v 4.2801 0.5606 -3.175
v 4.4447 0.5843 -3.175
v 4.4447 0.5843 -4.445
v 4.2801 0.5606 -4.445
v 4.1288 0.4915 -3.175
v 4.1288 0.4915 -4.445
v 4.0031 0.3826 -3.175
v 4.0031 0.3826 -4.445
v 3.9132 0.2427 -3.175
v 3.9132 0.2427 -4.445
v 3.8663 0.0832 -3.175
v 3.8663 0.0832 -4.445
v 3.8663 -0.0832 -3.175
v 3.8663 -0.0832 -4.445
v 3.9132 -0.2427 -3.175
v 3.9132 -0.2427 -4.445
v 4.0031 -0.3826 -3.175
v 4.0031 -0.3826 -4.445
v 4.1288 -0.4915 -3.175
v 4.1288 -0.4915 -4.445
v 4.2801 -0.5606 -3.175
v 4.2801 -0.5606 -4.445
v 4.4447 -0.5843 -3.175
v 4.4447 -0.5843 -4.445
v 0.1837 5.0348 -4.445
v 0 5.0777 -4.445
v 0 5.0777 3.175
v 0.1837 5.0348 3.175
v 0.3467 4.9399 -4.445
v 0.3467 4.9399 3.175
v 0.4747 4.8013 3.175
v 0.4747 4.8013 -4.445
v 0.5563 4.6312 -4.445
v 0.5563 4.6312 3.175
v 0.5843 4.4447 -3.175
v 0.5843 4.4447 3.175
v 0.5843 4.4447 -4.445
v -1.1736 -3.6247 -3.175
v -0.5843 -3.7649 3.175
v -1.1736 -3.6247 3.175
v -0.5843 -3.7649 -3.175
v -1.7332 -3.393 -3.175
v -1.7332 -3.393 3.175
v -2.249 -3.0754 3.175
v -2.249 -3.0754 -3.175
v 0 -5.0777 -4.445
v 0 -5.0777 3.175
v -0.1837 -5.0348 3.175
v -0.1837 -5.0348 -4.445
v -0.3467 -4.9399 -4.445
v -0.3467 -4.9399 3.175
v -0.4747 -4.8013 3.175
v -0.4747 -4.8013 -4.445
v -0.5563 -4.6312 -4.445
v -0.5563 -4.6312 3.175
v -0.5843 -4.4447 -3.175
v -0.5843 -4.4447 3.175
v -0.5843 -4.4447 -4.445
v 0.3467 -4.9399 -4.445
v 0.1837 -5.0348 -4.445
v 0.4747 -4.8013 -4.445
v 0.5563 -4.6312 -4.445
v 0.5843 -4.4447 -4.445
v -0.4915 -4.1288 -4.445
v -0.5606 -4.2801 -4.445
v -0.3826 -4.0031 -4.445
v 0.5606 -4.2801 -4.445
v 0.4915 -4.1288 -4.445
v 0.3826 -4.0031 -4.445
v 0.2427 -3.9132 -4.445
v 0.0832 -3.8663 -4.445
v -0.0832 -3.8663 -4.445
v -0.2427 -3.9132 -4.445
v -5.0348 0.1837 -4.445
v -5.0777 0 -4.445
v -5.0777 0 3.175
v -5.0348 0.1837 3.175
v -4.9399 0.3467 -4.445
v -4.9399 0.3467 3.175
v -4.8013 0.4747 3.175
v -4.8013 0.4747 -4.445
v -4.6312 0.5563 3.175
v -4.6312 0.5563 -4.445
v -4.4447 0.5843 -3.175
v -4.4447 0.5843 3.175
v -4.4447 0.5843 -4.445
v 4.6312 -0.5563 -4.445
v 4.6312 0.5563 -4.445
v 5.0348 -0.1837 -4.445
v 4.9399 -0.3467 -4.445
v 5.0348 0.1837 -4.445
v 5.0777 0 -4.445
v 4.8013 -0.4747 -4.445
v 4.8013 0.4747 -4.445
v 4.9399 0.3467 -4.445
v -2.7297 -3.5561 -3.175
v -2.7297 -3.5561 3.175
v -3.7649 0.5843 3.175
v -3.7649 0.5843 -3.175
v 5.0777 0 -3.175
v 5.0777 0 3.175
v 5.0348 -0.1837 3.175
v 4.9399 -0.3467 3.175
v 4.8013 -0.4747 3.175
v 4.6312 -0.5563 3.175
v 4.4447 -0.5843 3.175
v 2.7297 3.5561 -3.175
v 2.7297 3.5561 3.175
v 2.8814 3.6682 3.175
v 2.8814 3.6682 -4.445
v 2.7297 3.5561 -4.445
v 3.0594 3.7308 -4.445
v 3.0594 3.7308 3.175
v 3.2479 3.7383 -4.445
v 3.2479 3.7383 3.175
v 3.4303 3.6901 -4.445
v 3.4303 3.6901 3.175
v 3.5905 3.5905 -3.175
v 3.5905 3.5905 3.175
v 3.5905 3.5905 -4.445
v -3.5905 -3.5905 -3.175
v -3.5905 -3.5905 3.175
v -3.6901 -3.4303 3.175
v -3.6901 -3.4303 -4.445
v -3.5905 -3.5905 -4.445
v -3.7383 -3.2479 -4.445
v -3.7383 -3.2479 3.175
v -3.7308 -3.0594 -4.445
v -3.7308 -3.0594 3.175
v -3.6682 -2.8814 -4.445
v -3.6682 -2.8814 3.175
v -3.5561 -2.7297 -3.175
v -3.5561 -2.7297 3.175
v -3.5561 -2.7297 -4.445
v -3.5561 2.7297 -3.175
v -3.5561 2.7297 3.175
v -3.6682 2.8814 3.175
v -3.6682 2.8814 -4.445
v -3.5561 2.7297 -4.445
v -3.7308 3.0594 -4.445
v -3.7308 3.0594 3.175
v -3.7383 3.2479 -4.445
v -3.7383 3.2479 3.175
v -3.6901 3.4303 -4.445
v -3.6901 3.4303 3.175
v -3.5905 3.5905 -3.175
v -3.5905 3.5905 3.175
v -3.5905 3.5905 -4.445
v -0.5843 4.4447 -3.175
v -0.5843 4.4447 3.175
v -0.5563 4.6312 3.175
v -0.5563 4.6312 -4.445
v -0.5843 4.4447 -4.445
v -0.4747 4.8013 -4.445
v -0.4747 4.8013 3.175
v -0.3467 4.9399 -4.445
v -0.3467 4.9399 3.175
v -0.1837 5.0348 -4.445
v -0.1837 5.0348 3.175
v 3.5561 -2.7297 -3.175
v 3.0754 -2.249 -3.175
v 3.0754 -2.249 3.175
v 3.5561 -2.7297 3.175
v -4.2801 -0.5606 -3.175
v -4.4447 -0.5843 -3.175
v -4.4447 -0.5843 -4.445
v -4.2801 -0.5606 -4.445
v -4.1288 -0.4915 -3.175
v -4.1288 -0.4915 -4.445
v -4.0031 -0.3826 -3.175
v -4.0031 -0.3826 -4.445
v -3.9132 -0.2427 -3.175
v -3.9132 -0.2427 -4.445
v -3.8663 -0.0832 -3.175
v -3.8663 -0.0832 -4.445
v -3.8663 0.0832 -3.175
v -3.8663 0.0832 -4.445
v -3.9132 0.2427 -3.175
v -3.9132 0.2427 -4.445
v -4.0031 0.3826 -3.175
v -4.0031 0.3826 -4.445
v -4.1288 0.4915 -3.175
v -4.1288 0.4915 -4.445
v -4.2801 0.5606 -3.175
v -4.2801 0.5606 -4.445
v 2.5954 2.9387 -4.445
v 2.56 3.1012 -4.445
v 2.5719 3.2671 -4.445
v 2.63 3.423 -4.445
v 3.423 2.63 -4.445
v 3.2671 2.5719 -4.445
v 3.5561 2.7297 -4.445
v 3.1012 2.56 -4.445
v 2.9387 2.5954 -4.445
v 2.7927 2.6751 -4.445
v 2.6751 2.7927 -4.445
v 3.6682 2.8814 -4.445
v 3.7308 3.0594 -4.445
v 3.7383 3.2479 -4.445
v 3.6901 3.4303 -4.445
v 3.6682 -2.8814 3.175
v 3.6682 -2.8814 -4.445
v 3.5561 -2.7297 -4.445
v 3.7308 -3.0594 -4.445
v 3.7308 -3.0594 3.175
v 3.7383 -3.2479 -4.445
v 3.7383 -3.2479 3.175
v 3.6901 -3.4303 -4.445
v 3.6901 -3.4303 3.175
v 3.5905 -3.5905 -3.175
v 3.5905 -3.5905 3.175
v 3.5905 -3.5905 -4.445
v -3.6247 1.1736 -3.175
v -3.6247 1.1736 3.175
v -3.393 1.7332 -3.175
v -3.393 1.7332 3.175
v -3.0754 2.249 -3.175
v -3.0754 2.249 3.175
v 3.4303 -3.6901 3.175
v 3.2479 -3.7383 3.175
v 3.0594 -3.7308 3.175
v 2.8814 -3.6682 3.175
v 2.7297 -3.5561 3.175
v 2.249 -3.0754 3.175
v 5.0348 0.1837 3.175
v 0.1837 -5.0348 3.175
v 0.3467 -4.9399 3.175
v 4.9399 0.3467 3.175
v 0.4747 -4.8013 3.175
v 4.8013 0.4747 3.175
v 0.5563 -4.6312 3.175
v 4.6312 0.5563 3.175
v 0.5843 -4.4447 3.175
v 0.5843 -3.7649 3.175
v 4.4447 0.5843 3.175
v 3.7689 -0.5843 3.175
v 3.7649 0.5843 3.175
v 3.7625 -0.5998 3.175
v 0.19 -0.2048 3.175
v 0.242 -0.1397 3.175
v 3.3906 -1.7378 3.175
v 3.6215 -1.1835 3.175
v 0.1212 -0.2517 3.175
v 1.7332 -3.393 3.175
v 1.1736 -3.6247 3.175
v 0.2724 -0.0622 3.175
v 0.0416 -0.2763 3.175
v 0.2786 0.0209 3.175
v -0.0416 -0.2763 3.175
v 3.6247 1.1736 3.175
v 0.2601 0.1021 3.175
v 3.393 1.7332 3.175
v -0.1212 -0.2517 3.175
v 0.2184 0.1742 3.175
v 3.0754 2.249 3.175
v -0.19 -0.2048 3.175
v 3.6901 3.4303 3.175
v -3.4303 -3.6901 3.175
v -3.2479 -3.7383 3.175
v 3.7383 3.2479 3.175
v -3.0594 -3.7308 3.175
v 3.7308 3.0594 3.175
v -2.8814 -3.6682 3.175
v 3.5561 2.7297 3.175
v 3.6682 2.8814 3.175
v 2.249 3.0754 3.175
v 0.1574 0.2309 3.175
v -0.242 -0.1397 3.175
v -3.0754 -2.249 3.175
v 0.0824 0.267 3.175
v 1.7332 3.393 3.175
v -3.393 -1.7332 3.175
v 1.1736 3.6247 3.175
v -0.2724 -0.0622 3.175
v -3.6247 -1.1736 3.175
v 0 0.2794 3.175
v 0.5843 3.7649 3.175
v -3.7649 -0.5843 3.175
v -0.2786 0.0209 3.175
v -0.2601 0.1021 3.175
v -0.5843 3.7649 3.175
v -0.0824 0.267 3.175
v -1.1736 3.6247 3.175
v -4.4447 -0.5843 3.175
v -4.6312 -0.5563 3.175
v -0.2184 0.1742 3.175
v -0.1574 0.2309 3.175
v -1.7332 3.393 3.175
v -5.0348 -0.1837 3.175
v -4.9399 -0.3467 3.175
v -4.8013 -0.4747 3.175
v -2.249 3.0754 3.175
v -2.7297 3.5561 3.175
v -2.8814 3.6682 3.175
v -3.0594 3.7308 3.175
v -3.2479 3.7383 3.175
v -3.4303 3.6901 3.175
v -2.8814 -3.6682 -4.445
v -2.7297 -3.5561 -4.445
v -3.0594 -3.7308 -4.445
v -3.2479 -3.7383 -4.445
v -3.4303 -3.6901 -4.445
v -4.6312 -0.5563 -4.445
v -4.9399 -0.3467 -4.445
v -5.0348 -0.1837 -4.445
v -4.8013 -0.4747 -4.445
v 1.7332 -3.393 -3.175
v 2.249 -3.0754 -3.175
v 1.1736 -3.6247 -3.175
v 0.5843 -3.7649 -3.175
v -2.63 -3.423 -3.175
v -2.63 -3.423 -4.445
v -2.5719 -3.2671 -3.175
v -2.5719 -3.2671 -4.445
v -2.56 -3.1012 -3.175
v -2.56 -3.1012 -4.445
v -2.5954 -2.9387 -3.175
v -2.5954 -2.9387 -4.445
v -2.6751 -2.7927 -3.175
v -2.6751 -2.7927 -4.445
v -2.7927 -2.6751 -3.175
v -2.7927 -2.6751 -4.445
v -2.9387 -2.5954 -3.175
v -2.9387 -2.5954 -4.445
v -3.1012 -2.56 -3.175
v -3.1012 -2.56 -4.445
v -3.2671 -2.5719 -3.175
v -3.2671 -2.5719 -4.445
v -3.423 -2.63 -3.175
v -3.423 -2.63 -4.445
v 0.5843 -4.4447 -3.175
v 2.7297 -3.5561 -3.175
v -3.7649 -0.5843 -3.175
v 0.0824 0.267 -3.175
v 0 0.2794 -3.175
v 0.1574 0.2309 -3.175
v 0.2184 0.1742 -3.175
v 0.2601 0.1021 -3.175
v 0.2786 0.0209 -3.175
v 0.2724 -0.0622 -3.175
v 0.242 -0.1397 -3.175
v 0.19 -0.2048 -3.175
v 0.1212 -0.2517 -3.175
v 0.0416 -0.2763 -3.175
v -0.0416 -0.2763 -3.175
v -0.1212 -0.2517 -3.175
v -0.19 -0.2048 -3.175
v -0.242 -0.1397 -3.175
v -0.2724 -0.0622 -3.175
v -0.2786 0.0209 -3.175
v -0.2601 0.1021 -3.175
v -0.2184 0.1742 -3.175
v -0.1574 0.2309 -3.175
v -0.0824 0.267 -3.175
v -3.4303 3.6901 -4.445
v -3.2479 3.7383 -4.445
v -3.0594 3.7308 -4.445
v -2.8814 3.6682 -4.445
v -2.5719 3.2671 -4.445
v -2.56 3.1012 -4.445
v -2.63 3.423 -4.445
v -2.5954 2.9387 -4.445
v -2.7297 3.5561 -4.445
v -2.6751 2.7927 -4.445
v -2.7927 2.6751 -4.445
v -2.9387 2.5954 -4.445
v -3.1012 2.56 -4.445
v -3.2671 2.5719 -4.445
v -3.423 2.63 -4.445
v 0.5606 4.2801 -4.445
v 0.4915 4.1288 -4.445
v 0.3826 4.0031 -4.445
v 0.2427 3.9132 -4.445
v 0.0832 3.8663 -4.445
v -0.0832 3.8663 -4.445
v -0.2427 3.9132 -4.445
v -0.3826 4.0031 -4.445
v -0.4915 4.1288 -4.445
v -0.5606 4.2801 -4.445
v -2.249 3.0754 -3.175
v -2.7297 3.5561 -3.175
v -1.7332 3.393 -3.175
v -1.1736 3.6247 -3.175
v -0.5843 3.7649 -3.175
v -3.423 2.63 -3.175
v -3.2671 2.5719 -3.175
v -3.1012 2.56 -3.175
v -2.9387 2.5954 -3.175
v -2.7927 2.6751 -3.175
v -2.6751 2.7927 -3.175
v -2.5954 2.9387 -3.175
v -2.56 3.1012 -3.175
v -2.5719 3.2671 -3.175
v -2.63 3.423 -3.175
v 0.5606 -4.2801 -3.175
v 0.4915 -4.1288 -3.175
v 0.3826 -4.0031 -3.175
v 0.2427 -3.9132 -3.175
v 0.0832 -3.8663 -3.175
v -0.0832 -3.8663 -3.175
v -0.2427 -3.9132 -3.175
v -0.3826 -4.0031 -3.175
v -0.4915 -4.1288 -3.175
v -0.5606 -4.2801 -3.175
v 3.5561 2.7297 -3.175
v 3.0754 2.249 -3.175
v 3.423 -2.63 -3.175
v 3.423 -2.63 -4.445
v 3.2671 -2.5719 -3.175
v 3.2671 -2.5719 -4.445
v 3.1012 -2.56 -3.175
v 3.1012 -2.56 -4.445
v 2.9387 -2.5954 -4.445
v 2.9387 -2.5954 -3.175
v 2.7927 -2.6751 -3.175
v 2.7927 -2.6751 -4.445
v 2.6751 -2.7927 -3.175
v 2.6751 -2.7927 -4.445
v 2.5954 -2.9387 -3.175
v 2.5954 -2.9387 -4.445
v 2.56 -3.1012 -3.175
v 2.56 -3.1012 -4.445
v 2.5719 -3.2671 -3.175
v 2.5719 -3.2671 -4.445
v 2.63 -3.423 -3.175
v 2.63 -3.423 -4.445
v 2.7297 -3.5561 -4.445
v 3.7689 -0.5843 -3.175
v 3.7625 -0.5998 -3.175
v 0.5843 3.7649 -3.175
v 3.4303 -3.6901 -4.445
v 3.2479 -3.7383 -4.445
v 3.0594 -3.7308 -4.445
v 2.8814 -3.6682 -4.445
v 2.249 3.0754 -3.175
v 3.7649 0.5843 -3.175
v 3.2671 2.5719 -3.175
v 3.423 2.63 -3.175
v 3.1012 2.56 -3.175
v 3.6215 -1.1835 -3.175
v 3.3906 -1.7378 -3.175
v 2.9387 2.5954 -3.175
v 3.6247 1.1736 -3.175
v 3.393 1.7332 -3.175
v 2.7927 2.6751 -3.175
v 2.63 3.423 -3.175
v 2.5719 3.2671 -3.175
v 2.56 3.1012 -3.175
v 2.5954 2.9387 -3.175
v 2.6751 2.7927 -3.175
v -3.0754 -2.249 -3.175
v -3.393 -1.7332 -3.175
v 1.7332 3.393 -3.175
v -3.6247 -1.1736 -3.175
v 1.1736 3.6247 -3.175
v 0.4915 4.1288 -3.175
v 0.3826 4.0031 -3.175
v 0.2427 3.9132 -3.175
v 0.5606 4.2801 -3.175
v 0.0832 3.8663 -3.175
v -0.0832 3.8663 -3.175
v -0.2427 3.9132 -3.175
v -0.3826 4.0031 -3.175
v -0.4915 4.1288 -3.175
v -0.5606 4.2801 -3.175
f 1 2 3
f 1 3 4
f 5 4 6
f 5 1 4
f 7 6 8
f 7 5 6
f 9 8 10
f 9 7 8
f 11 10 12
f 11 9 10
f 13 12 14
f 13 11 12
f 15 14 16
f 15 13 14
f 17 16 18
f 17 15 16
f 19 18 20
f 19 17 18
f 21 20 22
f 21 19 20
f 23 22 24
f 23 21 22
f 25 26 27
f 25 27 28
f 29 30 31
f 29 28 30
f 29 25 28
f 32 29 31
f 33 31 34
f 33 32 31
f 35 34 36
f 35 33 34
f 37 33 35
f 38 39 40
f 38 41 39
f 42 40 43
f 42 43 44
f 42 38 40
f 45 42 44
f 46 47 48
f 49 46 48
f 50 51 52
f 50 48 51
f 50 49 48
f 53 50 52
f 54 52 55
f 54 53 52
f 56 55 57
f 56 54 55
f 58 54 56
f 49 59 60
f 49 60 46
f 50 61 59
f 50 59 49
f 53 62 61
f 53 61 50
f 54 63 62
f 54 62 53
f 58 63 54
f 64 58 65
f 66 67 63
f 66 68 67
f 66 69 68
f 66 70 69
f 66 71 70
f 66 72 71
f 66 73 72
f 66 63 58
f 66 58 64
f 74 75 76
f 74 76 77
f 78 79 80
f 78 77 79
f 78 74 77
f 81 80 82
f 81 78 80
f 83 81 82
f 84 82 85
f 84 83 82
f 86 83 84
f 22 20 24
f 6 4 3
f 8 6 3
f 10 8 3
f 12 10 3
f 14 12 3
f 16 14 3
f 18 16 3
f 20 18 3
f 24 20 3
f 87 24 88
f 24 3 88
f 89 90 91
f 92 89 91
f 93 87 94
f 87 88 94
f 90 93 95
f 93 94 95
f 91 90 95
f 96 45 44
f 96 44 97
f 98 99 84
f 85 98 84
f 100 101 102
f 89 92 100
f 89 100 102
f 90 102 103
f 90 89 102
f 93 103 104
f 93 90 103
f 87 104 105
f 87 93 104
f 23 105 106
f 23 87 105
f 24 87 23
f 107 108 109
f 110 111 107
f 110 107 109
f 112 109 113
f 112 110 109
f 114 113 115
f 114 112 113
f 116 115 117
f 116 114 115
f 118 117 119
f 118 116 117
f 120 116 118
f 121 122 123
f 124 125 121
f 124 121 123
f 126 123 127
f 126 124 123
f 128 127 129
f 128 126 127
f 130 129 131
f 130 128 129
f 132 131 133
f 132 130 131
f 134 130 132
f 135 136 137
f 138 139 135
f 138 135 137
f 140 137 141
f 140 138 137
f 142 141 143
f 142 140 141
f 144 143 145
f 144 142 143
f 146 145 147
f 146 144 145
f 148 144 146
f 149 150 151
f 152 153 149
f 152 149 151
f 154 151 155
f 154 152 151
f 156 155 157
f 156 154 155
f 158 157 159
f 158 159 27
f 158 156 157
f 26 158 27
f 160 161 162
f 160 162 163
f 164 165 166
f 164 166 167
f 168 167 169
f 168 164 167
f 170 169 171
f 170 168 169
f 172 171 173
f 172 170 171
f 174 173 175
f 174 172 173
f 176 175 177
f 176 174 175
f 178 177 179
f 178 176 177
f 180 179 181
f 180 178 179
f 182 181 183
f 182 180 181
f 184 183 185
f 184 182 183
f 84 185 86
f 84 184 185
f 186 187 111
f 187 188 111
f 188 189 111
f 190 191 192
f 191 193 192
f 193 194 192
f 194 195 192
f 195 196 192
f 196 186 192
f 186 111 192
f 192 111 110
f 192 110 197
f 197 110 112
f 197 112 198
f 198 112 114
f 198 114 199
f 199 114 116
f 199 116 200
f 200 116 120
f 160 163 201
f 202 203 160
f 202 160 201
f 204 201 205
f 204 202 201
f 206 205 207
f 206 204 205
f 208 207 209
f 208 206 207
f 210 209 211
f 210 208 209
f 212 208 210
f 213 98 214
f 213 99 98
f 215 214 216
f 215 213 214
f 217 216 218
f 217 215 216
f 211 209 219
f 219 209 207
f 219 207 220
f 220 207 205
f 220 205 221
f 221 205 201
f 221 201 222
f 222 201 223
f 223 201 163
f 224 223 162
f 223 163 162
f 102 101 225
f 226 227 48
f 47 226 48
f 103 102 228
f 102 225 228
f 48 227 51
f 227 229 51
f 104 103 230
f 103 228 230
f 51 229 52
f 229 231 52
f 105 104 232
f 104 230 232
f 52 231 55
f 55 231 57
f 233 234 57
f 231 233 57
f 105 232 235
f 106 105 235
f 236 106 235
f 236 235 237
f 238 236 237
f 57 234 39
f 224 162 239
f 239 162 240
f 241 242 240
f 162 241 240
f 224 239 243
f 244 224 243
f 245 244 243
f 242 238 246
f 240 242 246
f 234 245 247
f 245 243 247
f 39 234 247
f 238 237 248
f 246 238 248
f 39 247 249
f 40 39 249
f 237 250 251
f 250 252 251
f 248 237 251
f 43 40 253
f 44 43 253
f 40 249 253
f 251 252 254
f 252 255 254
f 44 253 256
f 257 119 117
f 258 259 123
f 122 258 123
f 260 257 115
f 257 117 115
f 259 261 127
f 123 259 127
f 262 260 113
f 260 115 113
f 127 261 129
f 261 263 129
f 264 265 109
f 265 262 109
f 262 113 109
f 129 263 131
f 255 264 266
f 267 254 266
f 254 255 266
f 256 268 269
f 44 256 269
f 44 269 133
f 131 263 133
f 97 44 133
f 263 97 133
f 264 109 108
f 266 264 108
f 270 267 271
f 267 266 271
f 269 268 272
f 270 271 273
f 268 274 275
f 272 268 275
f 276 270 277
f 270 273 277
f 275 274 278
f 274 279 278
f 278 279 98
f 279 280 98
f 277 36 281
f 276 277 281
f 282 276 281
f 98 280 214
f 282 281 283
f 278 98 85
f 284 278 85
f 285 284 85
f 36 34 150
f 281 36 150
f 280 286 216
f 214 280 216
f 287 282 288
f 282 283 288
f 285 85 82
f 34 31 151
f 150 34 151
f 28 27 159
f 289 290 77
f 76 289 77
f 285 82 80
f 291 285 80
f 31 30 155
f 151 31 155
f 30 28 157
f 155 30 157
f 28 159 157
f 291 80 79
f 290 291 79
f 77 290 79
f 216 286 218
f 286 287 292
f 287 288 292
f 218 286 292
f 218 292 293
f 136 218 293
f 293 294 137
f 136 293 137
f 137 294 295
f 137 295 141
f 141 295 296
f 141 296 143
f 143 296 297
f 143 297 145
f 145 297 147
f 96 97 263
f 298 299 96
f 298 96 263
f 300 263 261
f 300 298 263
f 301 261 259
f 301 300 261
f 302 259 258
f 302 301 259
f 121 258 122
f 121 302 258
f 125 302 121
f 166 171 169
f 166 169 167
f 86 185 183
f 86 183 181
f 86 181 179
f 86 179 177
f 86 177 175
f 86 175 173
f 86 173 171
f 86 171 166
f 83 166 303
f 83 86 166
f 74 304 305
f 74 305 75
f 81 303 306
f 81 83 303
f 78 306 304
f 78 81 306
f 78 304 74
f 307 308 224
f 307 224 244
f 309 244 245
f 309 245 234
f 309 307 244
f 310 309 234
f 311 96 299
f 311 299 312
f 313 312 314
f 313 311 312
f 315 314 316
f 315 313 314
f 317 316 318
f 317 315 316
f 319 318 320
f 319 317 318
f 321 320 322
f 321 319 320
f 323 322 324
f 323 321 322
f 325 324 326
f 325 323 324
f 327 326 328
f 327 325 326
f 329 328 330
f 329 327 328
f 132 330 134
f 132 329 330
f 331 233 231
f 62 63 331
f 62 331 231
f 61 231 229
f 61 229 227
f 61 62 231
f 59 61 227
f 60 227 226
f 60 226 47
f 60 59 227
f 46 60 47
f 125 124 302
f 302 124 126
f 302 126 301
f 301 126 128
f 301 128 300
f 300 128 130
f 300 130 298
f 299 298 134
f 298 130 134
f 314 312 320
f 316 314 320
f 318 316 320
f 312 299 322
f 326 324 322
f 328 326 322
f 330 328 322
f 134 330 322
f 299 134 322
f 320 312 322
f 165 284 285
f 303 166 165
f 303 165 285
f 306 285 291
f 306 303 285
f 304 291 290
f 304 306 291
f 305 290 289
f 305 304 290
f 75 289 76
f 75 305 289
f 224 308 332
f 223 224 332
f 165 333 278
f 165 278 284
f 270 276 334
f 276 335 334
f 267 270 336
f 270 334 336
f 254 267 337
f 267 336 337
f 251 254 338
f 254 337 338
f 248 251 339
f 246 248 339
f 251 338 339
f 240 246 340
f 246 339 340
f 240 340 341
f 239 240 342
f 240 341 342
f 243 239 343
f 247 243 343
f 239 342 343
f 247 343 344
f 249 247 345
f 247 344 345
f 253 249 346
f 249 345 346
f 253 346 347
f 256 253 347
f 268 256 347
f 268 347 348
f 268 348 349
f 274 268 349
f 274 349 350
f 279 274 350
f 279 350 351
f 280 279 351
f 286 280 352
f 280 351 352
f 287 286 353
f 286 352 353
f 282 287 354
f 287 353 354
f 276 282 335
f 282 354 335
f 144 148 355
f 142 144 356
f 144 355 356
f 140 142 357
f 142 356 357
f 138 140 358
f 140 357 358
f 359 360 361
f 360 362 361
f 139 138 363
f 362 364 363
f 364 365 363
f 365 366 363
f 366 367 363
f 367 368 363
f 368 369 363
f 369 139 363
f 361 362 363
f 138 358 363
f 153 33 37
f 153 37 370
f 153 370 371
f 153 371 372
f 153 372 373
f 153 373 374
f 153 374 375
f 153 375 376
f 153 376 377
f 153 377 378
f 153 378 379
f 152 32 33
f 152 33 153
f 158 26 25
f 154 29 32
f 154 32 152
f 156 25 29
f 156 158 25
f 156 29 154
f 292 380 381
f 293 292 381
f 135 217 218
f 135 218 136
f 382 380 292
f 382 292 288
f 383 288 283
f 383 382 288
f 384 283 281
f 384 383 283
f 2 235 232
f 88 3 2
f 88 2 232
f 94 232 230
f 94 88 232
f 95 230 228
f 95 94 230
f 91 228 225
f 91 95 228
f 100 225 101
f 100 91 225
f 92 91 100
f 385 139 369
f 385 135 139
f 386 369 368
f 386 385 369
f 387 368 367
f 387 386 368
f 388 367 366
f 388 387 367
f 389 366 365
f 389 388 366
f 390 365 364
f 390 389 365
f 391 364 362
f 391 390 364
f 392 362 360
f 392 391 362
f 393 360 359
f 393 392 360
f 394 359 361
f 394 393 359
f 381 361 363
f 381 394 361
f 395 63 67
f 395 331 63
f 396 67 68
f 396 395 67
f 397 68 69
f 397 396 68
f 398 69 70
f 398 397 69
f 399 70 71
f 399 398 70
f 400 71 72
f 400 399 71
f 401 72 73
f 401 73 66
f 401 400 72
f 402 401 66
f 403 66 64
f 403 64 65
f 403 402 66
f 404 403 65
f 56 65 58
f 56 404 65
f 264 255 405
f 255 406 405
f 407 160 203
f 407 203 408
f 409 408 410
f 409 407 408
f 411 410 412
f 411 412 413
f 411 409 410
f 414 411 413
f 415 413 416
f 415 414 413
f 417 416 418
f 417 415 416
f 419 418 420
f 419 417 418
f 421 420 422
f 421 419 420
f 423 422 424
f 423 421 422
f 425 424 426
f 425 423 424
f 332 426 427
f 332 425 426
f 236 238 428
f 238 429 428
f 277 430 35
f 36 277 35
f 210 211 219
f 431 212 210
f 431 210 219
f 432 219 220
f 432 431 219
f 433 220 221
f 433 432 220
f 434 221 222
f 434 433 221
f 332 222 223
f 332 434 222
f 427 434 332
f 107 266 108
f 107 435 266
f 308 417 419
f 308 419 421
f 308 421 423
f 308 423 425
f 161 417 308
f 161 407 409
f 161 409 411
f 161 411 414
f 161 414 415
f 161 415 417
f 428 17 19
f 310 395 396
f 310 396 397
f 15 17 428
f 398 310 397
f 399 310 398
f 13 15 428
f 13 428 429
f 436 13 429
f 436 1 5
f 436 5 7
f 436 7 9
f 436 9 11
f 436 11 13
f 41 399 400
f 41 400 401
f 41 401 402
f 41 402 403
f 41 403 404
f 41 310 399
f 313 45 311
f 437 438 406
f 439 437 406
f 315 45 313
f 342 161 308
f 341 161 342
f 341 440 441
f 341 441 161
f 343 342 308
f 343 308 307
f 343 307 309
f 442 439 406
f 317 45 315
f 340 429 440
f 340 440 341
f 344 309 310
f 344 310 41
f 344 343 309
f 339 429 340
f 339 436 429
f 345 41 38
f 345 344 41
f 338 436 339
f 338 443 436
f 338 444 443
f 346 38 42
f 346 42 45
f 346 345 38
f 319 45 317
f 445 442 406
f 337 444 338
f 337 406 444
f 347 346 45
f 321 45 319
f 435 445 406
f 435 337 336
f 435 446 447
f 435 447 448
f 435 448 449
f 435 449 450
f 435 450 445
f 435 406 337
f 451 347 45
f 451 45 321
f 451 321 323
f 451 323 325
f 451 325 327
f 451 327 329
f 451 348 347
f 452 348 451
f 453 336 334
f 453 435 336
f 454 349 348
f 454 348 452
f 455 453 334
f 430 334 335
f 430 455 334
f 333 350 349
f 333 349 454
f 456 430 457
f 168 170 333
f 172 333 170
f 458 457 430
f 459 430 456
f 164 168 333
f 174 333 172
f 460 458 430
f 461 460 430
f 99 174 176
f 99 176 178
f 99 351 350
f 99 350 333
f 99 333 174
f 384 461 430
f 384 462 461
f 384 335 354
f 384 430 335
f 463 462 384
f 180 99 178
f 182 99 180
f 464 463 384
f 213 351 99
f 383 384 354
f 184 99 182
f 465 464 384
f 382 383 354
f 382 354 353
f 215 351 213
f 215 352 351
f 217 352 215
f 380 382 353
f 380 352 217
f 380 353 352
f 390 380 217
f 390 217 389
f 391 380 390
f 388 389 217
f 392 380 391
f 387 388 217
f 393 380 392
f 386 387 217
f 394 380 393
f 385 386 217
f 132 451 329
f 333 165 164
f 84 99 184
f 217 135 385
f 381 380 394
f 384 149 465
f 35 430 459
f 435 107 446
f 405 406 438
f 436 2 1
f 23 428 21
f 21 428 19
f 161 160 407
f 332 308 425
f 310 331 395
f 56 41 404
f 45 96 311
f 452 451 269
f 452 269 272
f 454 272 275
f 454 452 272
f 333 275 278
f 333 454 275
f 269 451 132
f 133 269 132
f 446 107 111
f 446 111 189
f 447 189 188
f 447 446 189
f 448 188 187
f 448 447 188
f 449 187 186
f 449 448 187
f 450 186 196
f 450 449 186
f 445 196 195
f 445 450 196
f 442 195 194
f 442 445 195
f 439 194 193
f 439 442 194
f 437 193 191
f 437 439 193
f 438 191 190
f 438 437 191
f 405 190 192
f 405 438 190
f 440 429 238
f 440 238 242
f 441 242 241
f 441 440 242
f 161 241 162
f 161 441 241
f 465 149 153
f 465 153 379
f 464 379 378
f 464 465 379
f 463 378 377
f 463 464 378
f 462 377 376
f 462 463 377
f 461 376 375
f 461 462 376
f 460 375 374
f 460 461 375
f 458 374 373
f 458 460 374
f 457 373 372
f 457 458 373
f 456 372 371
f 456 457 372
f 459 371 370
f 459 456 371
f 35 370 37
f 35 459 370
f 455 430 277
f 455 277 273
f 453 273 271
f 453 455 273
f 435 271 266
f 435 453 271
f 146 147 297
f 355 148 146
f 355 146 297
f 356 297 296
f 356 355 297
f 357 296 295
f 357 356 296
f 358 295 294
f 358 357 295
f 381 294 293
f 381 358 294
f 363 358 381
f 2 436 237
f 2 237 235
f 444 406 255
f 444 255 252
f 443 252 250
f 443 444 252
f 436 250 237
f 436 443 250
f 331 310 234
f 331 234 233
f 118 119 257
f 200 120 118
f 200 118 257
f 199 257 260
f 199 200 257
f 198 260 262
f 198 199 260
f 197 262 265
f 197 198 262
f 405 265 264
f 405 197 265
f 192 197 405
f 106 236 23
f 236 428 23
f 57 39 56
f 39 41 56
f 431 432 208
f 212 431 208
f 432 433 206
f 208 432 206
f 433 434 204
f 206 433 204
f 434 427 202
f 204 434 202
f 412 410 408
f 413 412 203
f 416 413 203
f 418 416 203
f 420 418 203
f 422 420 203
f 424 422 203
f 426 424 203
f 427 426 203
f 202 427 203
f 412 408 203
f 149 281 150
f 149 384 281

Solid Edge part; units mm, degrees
sketch "Sketch1" plane through (0, 0, 0) normal (0, 0, 1) x (1, 0, 0)
  arc A0 (-0.5843, 4.4447) -> (0, 5.0777) centre (0.0507, 4.4447) cw
  arc A1 (0.5843, 4.4447) -> (0, 5.0777) centre (-0.0507, 4.4447) ccw
  line L0 (0.5843, 3.7649) -> (0.5843, 4.4447)
  arc A2 (2.249, 3.0754) -> (0.5843, 3.7649) centre (0, 0) ccw
  line L1 (2.249, 3.0754) -> (2.7297, 3.5561)
  arc A3 (2.7297, 3.5561) -> (3.5905, 3.5905) centre (3.1787, 3.1071) cw
  arc A4 (3.5561, 2.7297) -> (3.5905, 3.5905) centre (3.1071, 3.1787) ccw
  line L2 (3.0754, 2.249) -> (3.5561, 2.7297)
  arc A5 (3.7649, 0.5843) -> (3.0754, 2.249) centre (0, 0) ccw
  line L3 (3.7649, 0.5843) -> (4.4447, 0.5843)
  arc A6 (4.4447, 0.5843) -> (5.0777, 0) centre (4.4447, -0.0507) cw
  arc A7 (4.4447, -0.5843) -> (5.0777, 0) centre (4.4447, 0.0507) ccw
  line L4 (3.7689, -0.5843) -> (4.4447, -0.5843)
  line L5 (3.7625, -0.5998) -> (3.7689, -0.5843)
  arc A8 (3.7625, -0.5998) -> (3.0754, -2.249) centre (0, 0) cw
  line L6 (3.0754, -2.249) -> (3.5561, -2.7297)
  arc A9 (3.5561, -2.7297) -> (3.5905, -3.5905) centre (3.1071, -3.1787) cw
  arc A10 (2.7297, -3.5561) -> (3.5905, -3.5905) centre (3.1787, -3.1071) ccw
  line L7 (2.249, -3.0754) -> (2.7297, -3.5561)
  arc A11 (2.249, -3.0754) -> (0.5843, -3.7649) centre (0, 0) cw
  line L8 (0.5843, -3.7649) -> (0.5843, -4.4447)
  arc A12 (0.5843, -4.4447) -> (0, -5.0777) centre (-0.0507, -4.4447) cw
  arc A13 (-0.5843, -4.4447) -> (0, -5.0777) centre (0.0507, -4.4447) ccw
  line L9 (-0.5843, -3.7649) -> (-0.5843, -4.4447)
  arc A14 (-0.5843, -3.7649) -> (-2.249, -3.0754) centre (0, 0) cw
  line L10 (-2.249, -3.0754) -> (-2.7297, -3.5561)
  arc A15 (-2.7297, -3.5561) -> (-3.5905, -3.5905) centre (-3.1787, -3.1071) cw
  arc A16 (-3.5561, -2.7297) -> (-3.5905, -3.5905) centre (-3.1071, -3.1787) ccw
  line L11 (-3.0754, -2.249) -> (-3.5561, -2.7297)
  arc A17 (-3.0754, -2.249) -> (-3.7649, -0.5843) centre (0, 0) cw
  line L12 (-3.7649, -0.5843) -> (-4.4447, -0.5843)
  arc A18 (-4.4447, -0.5843) -> (-5.0777, 0) centre (-4.4447, 0.0507) cw
  arc A19 (-4.4447, 0.5843) -> (-5.0777, 0) centre (-4.4447, -0.0507) ccw
  line L13 (-3.7649, 0.5843) -> (-4.4447, 0.5843)
  arc A20 (-3.7649, 0.5843) -> (-3.0754, 2.249) centre (0, 0) cw
  line L14 (-3.0754, 2.249) -> (-3.5561, 2.7297)
  arc A21 (-3.5561, 2.7297) -> (-3.5905, 3.5905) centre (-3.1071, 3.1787) cw
  arc A22 (-2.7297, 3.5561) -> (-3.5905, 3.5905) centre (-3.1787, 3.1071) ccw
  line L15 (-2.249, 3.0754) -> (-2.7297, 3.5561)
  arc A23 (-2.249, 3.0754) -> (-0.5843, 3.7649) centre (0, 0) cw
  line L16 (-0.5843, 3.7649) -> (-0.5843, 4.4447)
extrude "Protrusion1" add sketch "Sketch1" along normal mid plane 6.35
sketch "Sketch2" plane through (0, 0, 0) normal (0, 0, 1) x (1, 0, 0)
  arc A0 (3.5561, 2.7297) -> (3.5905, 3.5905) centre (3.1071, 3.1787) ccw
  arc A1 (2.7297, 3.5561) -> (3.5905, 3.5905) centre (3.1787, 3.1071) cw
  arc A2 (3.5561, 2.7297) -> (2.7297, 3.5561) centre (3.1429, 3.1429) cw
  arc A3 (4.4447, 0.5843) -> (4.4447, -0.5843) centre (4.4447, 0) ccw
  arc A4 (4.4447, -0.5843) -> (5.0777, 0) centre (4.4447, 0.0507) ccw
  arc A5 (4.4447, 0.5843) -> (5.0777, 0) centre (4.4447, -0.0507) cw
  arc A6 (3.5561, -2.7297) -> (2.7297, -3.5561) centre (3.1429, -3.1429) ccw
  arc A7 (2.7297, -3.5561) -> (3.5905, -3.5905) centre (3.1787, -3.1071) ccw
  arc A8 (3.5561, -2.7297) -> (3.5905, -3.5905) centre (3.1071, -3.1787) cw
  arc A9 (0.5843, -4.4447) -> (0, -5.0777) centre (-0.0507, -4.4447) cw
  arc A10 (-0.5843, -4.4447) -> (0, -5.0777) centre (0.0507, -4.4447) ccw
  arc A11 (0.5843, -4.4447) -> (-0.5843, -4.4447) centre (0, -4.4447) ccw
  arc A12 (-2.7297, -3.5561) -> (-3.5561, -2.7297) centre (-3.1429, -3.1429) ccw
  arc A13 (-3.5561, -2.7297) -> (-3.5905, -3.5905) centre (-3.1071, -3.1787) ccw
  arc A14 (-2.7297, -3.5561) -> (-3.5905, -3.5905) centre (-3.1787, -3.1071) cw
  arc A15 (-4.4447, 0.5843) -> (-4.4447, -0.5843) centre (-4.4447, 0) cw
  arc A16 (-4.4447, -0.5843) -> (-5.0777, 0) centre (-4.4447, 0.0507) cw
  arc A17 (-4.4447, 0.5843) -> (-5.0777, 0) centre (-4.4447, -0.0507) ccw
  arc A18 (-2.7297, 3.5561) -> (-3.5905, 3.5905) centre (-3.1787, 3.1071) ccw
  arc A19 (-3.5561, 2.7297) -> (-3.5905, 3.5905) centre (-3.1071, 3.1787) cw
  arc A20 (-2.7297, 3.5561) -> (-3.5561, 2.7297) centre (-3.1429, 3.1429) cw
  arc A21 (0.5843, 4.4447) -> (-0.5843, 4.4447) centre (0, 4.4447) cw
  arc A22 (-0.5843, 4.4447) -> (0, 5.0777) centre (0.0507, 4.4447) cw
  arc A23 (0.5843, 4.4447) -> (0, 5.0777) centre (-0.0507, 4.4447) ccw
  dimension "D1" = 3.81
  dimension "D2" = 0.0168
  dimension "D3" = 1.8019
extrude "ExtrudedProtrusion_2" add sketch "Sketch2" against normal blind 4.445
sketch "Sketch3" plane through (0, 0, -3.175) normal (0, 0, -1) x (0, 1, 0)
  circle A0 centre (0, 0) radius 0.2794
extrude "Cutout1" cut sketch "Sketch3" against normal blind 26.4035
